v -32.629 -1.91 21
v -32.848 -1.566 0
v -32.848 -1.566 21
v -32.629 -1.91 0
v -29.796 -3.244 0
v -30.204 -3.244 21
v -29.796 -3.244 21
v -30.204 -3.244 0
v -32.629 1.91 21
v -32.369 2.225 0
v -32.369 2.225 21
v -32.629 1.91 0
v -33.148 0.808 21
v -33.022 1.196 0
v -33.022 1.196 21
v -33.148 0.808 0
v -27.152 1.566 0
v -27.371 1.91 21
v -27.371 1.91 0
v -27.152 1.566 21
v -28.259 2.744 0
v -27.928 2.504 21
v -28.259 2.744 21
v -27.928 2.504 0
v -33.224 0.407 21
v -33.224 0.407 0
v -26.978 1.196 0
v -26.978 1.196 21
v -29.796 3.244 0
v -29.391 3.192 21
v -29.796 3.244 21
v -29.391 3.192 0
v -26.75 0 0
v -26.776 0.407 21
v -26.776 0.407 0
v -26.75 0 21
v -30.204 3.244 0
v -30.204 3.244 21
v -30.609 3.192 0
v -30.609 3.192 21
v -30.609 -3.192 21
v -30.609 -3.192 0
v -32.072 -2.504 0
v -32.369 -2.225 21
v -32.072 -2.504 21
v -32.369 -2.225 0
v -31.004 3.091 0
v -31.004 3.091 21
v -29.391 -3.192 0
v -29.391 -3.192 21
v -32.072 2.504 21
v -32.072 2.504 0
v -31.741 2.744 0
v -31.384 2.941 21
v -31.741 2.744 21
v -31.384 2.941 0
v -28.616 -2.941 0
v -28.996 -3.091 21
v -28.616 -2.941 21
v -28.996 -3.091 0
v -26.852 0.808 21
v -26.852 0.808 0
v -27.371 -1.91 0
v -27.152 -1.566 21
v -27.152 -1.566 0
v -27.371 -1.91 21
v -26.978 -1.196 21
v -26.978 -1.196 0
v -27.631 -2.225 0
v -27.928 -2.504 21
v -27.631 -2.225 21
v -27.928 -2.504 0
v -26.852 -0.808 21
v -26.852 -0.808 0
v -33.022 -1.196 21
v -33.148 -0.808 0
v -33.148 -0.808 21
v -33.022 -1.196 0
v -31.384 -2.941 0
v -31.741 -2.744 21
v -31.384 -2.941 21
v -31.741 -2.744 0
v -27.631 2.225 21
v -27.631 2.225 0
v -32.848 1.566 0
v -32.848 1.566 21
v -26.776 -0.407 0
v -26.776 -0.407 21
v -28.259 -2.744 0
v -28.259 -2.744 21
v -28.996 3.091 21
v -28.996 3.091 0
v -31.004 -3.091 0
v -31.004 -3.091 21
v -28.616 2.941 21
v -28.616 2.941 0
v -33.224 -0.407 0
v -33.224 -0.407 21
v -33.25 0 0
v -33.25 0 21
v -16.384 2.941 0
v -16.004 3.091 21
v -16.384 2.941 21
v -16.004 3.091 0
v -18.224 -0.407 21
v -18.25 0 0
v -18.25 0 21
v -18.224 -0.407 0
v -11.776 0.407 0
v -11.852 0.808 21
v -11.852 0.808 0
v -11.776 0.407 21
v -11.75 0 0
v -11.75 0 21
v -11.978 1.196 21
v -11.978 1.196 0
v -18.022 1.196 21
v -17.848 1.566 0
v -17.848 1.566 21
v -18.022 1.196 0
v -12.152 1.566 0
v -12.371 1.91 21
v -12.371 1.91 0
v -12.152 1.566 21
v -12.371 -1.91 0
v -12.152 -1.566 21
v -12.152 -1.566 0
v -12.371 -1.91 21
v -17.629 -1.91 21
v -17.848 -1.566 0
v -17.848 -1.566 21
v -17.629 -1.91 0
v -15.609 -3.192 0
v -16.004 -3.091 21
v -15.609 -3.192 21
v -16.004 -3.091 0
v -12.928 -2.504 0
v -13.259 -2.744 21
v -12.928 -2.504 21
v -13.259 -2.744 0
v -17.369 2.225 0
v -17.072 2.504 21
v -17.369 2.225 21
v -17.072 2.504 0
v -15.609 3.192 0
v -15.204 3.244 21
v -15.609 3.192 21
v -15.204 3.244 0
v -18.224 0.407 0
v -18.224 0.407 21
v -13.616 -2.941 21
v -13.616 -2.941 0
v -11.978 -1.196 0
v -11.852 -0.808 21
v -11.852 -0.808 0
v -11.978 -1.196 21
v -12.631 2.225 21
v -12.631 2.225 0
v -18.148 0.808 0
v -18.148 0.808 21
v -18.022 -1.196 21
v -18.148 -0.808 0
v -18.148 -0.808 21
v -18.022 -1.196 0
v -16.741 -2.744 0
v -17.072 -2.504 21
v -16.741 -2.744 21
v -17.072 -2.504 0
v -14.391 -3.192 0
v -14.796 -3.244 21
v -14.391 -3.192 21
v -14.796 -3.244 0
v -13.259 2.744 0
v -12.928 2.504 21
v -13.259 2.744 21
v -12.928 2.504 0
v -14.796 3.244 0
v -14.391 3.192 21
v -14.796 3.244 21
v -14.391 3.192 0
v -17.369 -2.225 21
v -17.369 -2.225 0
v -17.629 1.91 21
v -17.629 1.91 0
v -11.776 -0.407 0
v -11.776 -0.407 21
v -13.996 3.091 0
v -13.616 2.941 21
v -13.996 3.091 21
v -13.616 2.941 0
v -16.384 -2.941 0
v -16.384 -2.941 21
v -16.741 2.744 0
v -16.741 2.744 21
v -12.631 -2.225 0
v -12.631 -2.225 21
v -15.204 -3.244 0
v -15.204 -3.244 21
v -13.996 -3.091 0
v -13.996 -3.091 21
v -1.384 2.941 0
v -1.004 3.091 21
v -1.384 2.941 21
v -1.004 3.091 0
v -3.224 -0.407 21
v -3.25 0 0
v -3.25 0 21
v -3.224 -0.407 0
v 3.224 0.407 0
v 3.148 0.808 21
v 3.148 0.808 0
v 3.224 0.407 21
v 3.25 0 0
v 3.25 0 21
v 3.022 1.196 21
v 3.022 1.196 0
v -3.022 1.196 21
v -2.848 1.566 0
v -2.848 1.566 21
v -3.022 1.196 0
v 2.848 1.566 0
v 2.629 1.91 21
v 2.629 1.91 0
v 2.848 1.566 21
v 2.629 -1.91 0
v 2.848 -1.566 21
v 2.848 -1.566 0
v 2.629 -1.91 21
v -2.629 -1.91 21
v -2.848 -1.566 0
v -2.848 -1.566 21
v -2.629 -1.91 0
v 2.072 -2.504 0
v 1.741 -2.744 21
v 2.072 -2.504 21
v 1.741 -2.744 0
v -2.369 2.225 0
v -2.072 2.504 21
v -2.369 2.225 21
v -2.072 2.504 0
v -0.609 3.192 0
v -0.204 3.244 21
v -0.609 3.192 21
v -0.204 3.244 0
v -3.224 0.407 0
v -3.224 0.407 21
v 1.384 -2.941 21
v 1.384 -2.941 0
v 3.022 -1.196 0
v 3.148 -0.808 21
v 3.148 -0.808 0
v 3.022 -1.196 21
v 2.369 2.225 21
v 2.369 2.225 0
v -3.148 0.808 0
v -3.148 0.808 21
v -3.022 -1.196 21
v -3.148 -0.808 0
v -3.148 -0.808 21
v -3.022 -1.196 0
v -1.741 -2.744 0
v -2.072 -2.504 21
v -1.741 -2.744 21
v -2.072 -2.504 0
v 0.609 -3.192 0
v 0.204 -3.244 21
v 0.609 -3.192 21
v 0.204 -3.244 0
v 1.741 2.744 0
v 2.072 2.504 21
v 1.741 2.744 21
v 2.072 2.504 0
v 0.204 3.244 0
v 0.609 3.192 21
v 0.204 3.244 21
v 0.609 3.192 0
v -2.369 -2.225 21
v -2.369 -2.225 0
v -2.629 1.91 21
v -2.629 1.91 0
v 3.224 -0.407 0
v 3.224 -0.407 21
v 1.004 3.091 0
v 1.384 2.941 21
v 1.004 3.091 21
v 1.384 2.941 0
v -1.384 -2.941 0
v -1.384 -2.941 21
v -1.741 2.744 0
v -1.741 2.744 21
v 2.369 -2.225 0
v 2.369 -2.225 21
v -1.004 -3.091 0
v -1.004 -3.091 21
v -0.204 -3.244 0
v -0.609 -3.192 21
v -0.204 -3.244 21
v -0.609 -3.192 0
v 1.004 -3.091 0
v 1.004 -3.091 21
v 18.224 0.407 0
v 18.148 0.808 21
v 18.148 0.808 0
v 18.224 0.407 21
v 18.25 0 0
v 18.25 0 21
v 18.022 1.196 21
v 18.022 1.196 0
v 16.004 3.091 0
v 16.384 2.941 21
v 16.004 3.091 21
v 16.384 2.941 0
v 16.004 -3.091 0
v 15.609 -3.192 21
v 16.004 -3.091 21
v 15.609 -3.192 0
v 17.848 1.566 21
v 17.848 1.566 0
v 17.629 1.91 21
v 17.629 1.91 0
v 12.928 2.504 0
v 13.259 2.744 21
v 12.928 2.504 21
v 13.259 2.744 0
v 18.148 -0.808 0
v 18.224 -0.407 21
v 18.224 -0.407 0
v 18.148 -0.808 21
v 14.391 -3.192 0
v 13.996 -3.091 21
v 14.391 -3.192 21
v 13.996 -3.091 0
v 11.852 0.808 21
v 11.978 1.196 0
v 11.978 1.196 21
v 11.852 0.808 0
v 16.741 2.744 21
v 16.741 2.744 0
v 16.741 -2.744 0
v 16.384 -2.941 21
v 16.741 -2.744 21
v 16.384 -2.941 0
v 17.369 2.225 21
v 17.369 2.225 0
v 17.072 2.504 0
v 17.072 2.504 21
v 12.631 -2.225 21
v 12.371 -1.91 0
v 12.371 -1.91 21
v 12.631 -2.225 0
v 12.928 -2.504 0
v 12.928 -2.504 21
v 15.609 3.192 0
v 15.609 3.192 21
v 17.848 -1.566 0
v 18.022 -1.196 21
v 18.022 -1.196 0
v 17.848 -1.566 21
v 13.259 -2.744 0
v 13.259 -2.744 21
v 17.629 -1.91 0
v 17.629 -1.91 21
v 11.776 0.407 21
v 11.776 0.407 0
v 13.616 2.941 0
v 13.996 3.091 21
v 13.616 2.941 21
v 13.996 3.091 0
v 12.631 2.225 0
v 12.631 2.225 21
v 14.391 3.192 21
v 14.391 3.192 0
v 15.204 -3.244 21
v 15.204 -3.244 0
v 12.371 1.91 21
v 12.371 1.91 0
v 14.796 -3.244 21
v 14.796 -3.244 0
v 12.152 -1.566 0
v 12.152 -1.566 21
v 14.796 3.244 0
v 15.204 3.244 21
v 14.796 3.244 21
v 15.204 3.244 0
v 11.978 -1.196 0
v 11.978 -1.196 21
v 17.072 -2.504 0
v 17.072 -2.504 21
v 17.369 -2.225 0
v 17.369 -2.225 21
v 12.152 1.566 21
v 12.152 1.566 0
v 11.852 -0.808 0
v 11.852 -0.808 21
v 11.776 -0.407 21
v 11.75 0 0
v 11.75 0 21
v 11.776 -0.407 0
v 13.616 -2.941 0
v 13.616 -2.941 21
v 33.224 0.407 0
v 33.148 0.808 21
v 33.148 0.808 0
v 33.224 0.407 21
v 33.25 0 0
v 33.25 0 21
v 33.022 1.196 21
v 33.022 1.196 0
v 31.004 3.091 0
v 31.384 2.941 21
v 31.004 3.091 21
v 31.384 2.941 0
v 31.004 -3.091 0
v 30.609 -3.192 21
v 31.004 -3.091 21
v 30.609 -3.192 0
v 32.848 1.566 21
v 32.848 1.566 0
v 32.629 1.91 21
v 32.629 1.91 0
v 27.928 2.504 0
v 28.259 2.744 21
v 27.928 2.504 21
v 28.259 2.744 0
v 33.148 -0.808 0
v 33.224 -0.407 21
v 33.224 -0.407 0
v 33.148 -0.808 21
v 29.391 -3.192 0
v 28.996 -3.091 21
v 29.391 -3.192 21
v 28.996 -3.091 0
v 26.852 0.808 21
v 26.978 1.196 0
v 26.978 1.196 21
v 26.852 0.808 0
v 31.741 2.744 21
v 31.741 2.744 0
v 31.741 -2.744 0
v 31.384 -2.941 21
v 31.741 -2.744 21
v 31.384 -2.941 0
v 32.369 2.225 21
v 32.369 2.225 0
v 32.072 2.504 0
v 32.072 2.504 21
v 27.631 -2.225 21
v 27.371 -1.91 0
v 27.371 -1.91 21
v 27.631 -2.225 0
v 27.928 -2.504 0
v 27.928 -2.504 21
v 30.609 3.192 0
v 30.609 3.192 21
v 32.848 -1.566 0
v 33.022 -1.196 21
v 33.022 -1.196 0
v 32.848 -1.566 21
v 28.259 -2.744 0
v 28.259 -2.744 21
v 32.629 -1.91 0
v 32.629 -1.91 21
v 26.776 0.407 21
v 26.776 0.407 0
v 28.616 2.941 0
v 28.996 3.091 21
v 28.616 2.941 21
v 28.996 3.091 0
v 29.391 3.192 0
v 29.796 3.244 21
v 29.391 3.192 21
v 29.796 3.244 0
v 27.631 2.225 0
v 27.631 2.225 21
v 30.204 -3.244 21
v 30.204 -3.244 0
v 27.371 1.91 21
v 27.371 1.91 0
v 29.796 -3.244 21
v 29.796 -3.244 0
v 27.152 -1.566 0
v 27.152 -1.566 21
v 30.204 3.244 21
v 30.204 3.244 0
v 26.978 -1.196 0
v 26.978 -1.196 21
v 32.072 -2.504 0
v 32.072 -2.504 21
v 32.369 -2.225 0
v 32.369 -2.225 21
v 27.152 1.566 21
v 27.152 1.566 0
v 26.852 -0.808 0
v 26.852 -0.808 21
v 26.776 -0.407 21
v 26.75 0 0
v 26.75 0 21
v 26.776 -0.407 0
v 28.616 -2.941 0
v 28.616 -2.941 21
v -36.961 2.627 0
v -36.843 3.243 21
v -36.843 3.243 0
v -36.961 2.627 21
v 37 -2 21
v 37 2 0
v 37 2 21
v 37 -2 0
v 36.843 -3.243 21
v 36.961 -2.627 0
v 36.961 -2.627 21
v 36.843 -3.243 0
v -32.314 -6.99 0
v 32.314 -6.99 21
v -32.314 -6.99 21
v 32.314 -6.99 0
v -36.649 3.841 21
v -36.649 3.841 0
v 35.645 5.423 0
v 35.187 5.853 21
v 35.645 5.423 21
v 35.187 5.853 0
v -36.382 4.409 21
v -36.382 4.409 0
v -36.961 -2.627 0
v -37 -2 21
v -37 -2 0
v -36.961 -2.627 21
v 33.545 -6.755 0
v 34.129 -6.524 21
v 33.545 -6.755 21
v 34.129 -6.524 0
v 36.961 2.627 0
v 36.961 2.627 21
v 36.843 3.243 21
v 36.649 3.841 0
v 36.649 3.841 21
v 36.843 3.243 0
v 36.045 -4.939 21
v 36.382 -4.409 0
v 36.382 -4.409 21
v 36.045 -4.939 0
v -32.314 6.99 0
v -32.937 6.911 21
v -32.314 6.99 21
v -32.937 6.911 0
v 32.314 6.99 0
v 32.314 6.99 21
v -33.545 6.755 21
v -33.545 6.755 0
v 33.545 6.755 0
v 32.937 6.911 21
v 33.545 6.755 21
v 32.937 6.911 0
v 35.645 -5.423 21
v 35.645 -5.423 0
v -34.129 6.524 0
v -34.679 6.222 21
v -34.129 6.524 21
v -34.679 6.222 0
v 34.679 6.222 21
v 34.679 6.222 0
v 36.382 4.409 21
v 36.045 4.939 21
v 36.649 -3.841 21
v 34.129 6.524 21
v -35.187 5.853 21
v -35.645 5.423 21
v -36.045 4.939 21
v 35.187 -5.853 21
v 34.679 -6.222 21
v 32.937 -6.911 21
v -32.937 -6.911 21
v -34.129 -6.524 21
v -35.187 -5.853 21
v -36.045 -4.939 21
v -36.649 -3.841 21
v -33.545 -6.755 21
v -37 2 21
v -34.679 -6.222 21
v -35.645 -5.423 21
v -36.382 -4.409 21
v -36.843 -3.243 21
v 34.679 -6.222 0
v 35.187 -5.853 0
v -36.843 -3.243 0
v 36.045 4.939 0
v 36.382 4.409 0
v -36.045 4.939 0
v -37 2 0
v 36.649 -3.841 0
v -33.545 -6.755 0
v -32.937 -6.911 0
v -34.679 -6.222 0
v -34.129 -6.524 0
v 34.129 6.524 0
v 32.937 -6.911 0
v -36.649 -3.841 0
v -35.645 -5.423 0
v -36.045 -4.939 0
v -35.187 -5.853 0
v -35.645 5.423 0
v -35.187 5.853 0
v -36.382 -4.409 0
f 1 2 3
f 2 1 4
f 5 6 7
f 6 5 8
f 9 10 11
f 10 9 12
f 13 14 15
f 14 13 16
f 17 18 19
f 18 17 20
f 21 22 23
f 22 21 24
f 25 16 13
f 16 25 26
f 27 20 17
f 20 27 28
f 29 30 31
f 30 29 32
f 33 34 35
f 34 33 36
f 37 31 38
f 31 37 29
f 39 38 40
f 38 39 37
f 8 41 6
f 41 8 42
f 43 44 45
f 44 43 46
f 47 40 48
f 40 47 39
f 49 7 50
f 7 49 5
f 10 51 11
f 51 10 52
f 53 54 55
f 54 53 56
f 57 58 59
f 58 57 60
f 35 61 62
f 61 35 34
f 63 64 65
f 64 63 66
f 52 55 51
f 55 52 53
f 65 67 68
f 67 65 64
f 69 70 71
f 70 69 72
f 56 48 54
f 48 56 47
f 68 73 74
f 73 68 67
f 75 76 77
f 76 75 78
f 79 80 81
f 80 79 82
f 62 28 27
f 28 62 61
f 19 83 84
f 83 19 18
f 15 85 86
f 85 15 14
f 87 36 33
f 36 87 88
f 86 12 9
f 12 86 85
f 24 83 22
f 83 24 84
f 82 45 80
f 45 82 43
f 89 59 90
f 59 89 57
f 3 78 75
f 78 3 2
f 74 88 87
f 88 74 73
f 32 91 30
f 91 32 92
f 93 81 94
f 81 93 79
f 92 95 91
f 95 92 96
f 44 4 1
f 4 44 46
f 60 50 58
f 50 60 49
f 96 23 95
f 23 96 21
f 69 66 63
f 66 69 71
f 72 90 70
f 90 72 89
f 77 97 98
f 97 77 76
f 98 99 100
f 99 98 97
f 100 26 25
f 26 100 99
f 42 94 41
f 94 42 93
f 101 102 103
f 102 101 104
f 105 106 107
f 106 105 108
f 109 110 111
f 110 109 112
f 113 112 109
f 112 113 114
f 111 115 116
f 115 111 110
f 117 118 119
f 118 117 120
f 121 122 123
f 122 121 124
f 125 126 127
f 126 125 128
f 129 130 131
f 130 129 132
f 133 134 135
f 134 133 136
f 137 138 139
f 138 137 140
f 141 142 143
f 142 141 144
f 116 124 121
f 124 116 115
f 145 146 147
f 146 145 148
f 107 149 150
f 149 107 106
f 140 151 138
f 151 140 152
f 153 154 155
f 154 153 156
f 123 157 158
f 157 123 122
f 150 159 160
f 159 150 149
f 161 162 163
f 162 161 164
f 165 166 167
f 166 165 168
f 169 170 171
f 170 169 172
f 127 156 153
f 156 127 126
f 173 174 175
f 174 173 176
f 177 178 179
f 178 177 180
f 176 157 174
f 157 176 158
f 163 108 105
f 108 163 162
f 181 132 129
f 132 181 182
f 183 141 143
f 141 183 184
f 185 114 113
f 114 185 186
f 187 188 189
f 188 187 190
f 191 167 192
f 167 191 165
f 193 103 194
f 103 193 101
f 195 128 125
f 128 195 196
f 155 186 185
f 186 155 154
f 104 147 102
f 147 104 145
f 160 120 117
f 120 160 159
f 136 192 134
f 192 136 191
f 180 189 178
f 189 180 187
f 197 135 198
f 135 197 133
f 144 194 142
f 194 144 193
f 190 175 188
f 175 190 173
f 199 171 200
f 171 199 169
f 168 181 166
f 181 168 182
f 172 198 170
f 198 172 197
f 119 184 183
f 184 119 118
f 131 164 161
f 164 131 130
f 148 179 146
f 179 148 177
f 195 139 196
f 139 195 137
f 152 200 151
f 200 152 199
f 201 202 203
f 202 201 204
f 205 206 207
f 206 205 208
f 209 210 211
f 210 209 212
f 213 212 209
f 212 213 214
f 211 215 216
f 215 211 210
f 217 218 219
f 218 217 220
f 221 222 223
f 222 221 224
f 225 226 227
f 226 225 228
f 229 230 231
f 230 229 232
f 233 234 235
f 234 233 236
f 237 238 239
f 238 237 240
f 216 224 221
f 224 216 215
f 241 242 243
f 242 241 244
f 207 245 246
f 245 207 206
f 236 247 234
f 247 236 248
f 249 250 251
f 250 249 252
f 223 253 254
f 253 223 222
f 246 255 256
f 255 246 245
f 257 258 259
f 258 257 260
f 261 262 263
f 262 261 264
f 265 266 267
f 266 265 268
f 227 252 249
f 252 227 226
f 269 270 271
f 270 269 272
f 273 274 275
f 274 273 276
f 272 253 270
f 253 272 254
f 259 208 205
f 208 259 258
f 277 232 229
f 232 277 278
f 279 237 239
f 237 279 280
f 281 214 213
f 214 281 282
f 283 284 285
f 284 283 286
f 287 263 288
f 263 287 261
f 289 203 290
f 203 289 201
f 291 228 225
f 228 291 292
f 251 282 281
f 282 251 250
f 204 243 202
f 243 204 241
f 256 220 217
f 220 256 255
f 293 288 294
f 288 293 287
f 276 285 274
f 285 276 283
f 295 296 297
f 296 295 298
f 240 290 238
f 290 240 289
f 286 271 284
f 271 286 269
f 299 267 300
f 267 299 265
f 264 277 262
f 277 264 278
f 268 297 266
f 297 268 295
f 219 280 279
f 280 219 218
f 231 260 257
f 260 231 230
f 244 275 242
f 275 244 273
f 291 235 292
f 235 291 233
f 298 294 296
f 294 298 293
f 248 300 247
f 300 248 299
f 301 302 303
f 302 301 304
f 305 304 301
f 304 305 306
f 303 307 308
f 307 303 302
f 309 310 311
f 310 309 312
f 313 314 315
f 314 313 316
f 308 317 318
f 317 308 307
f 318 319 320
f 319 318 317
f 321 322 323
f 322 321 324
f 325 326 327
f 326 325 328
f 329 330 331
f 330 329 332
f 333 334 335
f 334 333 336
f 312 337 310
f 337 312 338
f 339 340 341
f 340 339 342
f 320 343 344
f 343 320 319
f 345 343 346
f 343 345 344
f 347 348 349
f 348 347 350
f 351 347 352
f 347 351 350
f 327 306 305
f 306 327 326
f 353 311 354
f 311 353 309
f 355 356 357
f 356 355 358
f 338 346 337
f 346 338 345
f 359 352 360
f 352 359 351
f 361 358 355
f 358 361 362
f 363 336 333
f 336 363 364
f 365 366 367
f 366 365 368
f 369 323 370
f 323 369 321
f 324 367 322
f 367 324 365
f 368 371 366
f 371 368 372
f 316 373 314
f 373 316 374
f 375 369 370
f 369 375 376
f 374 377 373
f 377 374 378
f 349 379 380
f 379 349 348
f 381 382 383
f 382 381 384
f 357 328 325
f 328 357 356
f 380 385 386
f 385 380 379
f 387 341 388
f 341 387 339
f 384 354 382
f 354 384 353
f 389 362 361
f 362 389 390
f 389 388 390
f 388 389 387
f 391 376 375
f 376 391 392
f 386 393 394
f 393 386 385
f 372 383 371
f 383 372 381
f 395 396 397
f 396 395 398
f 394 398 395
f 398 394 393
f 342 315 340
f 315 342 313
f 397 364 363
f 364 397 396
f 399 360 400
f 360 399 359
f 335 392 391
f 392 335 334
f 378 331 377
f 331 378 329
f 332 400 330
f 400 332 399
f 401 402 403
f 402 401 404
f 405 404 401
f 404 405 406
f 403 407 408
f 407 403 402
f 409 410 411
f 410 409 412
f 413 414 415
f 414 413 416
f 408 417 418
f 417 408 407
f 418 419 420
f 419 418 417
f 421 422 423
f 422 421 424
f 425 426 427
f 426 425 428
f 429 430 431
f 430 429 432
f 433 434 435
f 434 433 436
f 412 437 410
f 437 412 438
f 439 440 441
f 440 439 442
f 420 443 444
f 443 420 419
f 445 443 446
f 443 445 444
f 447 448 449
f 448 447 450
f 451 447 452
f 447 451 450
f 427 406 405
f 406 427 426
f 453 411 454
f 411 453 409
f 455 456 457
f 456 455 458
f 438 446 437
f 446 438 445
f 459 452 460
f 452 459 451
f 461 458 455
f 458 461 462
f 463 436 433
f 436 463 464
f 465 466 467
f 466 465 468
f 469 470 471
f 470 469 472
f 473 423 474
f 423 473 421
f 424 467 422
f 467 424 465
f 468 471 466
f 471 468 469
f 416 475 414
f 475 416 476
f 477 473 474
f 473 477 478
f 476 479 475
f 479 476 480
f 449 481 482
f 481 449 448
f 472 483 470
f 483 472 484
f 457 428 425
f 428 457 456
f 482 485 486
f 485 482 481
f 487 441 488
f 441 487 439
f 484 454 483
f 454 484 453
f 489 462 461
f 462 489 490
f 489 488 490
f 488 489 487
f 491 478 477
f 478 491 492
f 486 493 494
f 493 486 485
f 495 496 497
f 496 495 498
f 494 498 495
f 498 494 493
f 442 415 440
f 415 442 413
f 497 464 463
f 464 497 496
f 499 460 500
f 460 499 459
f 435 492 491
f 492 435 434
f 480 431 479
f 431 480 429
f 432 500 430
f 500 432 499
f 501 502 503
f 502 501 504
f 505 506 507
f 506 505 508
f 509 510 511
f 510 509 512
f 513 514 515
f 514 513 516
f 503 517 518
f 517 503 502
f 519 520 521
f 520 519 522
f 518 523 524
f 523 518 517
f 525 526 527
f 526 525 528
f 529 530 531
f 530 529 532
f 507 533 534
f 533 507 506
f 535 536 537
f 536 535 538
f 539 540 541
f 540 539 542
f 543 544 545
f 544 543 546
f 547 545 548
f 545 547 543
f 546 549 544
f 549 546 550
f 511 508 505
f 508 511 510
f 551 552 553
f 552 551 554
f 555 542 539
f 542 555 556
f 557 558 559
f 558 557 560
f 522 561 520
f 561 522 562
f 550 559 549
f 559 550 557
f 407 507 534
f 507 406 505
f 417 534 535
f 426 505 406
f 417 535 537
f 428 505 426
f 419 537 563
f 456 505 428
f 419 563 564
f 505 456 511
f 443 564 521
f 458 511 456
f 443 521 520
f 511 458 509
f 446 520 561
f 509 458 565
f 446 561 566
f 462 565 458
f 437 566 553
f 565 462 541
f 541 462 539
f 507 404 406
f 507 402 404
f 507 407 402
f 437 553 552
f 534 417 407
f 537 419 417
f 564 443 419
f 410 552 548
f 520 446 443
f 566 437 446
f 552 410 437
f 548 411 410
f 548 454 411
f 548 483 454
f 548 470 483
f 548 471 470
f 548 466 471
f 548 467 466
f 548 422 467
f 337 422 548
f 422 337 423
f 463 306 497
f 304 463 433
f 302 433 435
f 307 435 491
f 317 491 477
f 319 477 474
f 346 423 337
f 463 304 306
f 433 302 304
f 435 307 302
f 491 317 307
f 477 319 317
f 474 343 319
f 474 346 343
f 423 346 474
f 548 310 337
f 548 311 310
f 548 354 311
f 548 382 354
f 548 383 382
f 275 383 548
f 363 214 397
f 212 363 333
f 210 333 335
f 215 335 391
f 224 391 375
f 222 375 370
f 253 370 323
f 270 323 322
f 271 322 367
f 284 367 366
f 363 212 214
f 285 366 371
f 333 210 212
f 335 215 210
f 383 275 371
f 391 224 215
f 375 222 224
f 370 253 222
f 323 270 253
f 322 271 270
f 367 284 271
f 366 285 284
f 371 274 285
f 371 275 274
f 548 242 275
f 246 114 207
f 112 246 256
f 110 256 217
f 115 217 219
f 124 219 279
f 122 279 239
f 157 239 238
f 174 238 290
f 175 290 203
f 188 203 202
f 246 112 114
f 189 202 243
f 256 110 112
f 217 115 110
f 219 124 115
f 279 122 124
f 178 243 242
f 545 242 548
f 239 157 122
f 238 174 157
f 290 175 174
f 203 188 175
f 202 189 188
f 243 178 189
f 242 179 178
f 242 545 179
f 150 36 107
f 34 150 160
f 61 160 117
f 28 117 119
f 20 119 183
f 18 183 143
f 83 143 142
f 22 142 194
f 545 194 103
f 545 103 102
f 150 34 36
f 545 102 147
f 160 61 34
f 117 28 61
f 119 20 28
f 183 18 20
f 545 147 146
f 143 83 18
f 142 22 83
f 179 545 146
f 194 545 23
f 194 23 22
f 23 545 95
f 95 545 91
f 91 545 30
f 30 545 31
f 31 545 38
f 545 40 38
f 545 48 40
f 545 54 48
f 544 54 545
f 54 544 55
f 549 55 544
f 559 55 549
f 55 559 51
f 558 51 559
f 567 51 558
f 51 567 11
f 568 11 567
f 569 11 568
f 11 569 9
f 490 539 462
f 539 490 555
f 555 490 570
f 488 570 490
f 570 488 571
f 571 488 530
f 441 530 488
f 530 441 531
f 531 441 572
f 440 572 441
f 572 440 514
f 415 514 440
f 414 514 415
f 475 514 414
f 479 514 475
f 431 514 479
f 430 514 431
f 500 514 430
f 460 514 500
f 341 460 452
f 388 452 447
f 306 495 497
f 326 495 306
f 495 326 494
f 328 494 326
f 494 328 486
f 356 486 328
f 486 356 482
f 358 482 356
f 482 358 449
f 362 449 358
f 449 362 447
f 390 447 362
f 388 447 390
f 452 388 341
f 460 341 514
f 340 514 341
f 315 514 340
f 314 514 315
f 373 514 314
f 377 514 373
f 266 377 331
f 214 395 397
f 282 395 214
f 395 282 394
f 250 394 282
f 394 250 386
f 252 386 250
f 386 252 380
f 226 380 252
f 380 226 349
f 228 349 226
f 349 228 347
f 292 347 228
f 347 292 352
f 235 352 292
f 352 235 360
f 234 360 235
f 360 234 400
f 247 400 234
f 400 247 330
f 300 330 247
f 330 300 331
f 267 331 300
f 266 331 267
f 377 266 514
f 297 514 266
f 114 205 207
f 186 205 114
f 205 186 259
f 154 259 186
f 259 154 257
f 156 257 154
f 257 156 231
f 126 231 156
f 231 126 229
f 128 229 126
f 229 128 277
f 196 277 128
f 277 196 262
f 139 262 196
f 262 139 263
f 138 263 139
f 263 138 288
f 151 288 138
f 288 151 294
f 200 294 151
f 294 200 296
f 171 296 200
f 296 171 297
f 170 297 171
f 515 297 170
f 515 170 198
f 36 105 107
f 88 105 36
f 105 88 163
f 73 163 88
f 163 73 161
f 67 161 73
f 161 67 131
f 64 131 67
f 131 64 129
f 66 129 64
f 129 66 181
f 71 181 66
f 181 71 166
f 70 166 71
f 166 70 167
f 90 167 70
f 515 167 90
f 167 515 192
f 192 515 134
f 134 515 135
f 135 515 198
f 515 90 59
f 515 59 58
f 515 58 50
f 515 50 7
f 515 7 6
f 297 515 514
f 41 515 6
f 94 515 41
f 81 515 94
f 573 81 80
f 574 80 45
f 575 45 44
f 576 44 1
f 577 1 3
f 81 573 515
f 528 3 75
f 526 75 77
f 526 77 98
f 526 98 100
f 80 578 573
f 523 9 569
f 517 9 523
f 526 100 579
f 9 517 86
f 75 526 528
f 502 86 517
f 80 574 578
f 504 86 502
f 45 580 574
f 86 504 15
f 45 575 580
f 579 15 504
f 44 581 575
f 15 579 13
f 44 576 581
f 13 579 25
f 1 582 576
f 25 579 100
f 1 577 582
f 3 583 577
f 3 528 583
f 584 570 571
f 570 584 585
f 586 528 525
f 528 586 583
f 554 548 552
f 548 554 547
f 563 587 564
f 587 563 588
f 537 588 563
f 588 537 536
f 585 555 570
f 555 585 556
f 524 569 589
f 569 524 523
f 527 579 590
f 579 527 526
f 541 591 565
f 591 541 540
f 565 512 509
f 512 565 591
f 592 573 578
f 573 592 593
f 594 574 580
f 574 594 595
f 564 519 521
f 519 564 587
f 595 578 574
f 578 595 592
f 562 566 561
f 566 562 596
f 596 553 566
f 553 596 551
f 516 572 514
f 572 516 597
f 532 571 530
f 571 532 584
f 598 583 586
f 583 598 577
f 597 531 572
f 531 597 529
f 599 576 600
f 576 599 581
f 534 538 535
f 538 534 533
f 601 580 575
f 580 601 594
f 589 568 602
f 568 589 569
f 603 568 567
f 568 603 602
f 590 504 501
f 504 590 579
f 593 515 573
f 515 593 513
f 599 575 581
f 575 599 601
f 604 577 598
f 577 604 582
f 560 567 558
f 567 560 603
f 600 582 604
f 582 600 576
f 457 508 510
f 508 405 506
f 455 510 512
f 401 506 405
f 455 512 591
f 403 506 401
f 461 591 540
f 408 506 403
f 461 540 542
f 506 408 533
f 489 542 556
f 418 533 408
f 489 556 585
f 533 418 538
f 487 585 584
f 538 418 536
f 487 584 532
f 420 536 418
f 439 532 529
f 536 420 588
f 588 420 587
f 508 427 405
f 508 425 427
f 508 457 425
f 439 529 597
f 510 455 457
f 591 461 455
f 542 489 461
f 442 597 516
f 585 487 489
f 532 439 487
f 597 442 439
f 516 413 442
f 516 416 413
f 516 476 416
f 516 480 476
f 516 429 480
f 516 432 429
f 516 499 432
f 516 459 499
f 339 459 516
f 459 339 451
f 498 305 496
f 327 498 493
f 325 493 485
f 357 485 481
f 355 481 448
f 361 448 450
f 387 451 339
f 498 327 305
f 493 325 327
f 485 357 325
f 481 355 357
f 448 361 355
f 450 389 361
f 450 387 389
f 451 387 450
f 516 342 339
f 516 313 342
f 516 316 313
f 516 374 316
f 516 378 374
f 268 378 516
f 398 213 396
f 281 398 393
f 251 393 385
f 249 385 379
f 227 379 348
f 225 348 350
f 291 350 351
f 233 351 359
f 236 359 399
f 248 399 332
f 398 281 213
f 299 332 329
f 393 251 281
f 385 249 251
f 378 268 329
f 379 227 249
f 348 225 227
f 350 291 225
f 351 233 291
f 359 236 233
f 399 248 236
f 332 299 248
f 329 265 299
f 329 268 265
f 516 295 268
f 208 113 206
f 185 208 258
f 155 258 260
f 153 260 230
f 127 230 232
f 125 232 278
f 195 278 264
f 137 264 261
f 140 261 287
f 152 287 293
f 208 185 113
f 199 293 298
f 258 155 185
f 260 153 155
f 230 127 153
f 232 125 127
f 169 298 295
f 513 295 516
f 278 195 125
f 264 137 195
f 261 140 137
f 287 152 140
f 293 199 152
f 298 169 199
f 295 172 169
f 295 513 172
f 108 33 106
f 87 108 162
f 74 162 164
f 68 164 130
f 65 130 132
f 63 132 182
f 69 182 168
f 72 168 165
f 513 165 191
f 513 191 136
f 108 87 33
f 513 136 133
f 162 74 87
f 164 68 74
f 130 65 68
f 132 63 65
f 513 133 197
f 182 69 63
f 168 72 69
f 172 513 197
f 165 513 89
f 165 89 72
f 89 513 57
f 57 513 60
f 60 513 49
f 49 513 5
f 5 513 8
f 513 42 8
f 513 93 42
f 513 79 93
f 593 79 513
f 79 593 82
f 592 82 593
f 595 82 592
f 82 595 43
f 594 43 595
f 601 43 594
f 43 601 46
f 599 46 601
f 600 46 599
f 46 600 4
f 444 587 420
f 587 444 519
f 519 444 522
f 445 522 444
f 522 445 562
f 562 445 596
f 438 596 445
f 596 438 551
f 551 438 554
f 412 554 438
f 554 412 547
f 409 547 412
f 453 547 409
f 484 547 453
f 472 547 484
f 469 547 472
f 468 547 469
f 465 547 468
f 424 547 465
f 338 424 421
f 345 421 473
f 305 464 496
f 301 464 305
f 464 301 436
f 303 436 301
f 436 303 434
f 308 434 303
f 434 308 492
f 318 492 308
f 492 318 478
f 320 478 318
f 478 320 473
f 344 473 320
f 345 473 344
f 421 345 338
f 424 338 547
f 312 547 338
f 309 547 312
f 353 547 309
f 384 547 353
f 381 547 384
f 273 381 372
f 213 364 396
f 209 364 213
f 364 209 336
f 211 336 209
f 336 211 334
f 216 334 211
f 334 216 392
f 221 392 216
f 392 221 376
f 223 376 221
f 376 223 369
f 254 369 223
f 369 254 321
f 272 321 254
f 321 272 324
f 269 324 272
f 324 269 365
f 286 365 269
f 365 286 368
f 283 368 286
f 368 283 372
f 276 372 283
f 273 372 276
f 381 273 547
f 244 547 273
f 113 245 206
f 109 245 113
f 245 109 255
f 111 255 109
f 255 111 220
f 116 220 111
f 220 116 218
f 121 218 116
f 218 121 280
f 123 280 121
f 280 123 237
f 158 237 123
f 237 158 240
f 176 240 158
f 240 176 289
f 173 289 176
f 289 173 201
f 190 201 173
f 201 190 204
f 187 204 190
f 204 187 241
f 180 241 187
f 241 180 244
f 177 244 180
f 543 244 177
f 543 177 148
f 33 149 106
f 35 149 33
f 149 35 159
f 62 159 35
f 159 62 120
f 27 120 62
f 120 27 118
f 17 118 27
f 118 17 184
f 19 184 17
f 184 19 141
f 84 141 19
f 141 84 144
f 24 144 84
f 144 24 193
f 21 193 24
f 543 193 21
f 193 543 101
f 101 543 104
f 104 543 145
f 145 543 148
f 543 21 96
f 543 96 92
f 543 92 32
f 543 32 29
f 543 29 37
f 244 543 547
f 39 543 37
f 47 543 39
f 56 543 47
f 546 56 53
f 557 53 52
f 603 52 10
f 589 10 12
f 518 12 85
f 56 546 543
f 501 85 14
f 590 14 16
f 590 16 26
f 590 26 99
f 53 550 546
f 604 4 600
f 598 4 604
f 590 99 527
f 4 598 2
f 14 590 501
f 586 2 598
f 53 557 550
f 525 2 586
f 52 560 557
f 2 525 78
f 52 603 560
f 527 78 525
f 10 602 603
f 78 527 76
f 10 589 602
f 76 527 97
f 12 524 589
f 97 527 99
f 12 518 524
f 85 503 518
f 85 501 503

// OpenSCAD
$fn = 50;


difference() {
	union() {
		hull() {
			translate(v = [-32.0000000000, 2.0000000000, 0]) {
				cylinder(h = 21, r = 5);
			}
			translate(v = [32.0000000000, 2.0000000000, 0]) {
				cylinder(h = 21, r = 5);
			}
			translate(v = [-32.0000000000, -2.0000000000, 0]) {
				cylinder(h = 21, r = 5);
			}
			translate(v = [32.0000000000, -2.0000000000, 0]) {
				cylinder(h = 21, r = 5);
			}
		}
	}
	union() {
		translate(v = [-30.0000000000, 0.0000000000, -100.0000000000]) {
			cylinder(h = 200, r = 3.2500000000);
		}
		translate(v = [-15.0000000000, 0.0000000000, -100.0000000000]) {
			cylinder(h = 200, r = 3.2500000000);
		}
		translate(v = [0.0000000000, 0.0000000000, -100.0000000000]) {
			cylinder(h = 200, r = 3.2500000000);
		}
		translate(v = [15.0000000000, 0.0000000000, -100.0000000000]) {
			cylinder(h = 200, r = 3.2500000000);
		}
		translate(v = [30.0000000000, 0.0000000000, -100.0000000000]) {
			cylinder(h = 200, r = 3.2500000000);
		}
	}
}
